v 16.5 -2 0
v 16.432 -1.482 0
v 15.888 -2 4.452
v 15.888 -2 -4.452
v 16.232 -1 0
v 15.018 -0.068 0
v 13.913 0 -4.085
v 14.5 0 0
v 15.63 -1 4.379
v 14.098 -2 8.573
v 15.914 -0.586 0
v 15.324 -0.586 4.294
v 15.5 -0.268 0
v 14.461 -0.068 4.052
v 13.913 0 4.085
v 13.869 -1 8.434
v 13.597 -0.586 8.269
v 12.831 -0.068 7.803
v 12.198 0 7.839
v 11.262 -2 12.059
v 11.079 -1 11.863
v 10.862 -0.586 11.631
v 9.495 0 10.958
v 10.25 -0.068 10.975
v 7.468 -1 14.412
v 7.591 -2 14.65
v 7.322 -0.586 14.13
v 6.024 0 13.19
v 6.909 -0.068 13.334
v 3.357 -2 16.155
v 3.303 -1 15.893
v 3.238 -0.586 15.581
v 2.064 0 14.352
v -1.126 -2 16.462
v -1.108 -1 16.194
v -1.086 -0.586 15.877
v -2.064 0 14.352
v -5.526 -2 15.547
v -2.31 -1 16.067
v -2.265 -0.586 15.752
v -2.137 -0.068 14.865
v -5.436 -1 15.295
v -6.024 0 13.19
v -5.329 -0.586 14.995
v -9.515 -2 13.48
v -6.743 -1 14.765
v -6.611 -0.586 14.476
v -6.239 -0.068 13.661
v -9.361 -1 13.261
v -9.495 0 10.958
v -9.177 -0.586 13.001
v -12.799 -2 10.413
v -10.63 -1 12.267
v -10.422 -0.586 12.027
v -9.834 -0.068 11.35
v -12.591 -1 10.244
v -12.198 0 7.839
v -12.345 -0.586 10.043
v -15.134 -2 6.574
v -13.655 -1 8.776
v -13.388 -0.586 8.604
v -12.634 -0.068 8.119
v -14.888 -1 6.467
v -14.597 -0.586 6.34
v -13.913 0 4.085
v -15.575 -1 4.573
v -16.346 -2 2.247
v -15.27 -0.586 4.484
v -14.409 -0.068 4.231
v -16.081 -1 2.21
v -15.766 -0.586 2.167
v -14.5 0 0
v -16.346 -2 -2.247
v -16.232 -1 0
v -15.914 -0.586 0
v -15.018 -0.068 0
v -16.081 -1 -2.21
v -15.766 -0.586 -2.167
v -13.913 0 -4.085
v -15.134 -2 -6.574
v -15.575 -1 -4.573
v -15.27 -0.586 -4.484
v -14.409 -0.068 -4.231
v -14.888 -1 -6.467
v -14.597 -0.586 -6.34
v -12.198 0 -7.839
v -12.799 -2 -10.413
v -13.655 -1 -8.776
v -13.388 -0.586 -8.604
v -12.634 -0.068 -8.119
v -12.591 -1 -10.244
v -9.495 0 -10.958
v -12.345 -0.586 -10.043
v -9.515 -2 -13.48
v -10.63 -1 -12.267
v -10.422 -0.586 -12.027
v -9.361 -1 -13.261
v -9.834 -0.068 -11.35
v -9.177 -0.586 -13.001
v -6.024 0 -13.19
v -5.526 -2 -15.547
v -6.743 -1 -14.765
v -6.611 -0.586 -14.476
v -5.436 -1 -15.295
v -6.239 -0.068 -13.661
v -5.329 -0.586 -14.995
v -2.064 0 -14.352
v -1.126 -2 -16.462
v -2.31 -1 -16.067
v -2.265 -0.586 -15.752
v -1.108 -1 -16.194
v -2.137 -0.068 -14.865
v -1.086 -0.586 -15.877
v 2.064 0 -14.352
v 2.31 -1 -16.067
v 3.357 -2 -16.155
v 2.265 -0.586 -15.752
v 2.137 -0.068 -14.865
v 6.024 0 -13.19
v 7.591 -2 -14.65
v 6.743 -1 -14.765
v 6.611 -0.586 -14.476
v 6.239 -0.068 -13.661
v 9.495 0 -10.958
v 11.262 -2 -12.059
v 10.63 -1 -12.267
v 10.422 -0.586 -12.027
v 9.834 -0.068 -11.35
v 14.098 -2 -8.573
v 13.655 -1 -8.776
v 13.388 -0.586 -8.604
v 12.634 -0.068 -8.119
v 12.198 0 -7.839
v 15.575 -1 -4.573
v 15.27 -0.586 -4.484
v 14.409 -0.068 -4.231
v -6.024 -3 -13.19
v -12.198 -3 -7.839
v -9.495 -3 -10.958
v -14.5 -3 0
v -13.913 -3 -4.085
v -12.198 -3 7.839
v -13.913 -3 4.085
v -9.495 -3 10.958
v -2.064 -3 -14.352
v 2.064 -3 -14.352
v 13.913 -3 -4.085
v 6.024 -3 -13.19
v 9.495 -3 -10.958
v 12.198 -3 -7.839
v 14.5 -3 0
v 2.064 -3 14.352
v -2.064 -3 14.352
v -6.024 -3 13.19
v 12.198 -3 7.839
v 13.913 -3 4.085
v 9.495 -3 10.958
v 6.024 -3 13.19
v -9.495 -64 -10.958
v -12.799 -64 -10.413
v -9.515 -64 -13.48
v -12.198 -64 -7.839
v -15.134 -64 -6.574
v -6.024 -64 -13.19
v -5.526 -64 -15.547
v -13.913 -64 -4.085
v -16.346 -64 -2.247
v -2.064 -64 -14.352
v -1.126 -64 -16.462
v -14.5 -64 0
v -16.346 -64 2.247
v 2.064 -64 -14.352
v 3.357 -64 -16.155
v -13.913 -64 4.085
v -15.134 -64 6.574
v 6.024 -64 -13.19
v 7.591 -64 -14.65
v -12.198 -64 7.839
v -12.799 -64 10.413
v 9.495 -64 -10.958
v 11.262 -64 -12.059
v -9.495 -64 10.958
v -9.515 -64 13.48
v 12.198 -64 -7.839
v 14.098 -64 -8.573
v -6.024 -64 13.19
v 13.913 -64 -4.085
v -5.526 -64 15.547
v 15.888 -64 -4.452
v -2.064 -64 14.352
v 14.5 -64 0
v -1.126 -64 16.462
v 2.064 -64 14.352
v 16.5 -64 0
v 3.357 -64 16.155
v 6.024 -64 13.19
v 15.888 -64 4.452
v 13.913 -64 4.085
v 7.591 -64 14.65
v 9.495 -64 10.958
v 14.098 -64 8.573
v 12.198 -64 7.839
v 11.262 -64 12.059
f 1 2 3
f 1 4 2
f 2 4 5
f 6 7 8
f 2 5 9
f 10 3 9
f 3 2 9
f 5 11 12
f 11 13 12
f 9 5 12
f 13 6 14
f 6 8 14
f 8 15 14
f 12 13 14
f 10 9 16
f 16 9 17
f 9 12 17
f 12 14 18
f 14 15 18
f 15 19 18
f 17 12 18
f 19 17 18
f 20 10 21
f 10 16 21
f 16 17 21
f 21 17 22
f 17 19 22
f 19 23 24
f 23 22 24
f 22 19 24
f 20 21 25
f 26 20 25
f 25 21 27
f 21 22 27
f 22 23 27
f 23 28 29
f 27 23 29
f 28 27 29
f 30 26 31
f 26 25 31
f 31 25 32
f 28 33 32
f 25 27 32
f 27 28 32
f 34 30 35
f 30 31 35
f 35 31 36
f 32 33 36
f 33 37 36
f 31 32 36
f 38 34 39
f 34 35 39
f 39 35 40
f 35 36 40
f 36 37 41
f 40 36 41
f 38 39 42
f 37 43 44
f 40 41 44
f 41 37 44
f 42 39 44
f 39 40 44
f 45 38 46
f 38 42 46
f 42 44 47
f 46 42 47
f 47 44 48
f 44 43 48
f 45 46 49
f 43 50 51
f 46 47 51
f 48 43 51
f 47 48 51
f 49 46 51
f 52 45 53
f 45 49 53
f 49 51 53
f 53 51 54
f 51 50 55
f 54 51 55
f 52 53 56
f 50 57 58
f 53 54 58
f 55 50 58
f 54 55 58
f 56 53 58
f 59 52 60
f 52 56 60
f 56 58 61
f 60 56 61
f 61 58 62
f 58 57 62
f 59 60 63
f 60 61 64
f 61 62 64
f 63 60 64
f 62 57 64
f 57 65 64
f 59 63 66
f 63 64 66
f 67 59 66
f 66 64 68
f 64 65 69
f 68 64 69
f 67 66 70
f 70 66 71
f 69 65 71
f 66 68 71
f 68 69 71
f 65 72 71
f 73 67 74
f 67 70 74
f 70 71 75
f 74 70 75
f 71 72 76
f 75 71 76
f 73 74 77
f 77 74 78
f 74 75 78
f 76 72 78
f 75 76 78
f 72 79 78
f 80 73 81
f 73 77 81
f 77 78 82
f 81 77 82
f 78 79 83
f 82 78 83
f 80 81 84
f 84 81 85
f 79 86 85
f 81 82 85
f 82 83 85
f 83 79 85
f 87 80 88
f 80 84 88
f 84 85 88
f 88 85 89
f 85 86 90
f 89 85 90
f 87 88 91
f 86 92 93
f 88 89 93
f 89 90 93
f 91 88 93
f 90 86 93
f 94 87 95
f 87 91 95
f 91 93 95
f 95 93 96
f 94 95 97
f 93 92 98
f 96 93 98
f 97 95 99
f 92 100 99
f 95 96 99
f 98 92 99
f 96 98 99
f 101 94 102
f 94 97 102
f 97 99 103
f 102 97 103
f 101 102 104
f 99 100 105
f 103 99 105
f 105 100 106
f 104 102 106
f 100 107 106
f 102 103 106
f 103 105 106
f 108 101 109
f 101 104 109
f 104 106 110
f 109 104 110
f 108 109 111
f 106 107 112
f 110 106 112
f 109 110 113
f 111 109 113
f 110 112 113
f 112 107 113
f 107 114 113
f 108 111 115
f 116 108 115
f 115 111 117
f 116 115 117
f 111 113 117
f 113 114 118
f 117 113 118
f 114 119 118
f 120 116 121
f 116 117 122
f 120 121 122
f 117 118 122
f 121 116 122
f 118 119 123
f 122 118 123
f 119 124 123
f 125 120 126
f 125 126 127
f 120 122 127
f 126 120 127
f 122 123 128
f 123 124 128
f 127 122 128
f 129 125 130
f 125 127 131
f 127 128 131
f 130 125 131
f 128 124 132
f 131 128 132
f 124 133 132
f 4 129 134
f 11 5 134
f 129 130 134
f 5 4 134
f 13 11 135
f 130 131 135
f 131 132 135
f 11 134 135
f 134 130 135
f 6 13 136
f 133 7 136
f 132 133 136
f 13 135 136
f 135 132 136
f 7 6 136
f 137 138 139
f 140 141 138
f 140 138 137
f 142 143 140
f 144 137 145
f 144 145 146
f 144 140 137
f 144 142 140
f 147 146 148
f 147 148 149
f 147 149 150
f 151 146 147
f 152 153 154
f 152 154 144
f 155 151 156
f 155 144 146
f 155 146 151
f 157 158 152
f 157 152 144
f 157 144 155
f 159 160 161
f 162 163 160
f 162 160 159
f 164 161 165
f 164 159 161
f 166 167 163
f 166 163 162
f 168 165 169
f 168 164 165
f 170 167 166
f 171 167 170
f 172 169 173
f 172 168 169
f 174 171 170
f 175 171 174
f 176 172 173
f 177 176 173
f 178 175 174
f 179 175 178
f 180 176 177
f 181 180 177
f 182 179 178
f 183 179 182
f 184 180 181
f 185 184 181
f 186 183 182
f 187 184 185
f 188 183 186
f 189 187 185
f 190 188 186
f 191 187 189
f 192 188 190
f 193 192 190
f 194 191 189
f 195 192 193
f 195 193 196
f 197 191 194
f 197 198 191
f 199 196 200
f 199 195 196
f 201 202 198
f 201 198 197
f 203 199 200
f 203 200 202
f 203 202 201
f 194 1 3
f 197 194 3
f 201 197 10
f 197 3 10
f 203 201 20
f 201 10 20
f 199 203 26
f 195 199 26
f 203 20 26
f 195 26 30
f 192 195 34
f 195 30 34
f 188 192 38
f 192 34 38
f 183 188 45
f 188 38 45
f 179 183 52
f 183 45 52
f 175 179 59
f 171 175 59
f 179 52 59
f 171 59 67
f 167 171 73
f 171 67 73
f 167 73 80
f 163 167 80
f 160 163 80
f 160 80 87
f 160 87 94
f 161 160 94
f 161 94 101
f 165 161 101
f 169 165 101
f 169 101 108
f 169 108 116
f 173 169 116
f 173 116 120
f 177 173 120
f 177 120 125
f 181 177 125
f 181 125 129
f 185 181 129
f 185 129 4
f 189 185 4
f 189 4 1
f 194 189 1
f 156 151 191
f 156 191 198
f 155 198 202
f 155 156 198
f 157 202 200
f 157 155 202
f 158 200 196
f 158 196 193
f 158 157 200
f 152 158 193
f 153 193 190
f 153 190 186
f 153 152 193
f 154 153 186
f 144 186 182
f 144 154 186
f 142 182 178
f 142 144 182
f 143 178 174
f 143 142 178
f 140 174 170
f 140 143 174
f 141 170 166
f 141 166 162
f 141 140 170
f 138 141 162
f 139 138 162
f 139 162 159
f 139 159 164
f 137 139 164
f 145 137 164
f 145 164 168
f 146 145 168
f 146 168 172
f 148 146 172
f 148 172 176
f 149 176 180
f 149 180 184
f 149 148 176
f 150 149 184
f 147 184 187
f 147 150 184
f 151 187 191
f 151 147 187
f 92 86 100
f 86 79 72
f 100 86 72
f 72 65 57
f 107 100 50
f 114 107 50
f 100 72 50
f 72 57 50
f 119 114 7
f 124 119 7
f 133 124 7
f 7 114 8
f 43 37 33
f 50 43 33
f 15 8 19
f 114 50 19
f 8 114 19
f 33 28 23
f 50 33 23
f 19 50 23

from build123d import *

# Parameters (mm, degrees)
F0_R     = 16.5
F1_DEPTH = 3
F2_R     = 16.5
F2_R_2   = 14.5
F3_DEPTH = 61
F4_R     = 2


with BuildPart() as f1:
    # F0 (on Front) → F1 (new body)
    with BuildSketch(Plane.XZ):
        Circle(F0_R)
    extrude(amount=F1_DEPTH)

    # F2 (on face) → F3 (join)
    with BuildSketch(Plane.XZ.offset(3)):
        Circle(F2_R)
        Circle(F2_R_2, mode=Mode.SUBTRACT)
    extrude(amount=F3_DEPTH)

    # F4
    f4_edges = [f1.edges().sort_by_distance(p)[0] for p in [
        (-16.5, 0, 0),
    ]]
    fillet(f4_edges, radius=F4_R)


solid = f1.part
